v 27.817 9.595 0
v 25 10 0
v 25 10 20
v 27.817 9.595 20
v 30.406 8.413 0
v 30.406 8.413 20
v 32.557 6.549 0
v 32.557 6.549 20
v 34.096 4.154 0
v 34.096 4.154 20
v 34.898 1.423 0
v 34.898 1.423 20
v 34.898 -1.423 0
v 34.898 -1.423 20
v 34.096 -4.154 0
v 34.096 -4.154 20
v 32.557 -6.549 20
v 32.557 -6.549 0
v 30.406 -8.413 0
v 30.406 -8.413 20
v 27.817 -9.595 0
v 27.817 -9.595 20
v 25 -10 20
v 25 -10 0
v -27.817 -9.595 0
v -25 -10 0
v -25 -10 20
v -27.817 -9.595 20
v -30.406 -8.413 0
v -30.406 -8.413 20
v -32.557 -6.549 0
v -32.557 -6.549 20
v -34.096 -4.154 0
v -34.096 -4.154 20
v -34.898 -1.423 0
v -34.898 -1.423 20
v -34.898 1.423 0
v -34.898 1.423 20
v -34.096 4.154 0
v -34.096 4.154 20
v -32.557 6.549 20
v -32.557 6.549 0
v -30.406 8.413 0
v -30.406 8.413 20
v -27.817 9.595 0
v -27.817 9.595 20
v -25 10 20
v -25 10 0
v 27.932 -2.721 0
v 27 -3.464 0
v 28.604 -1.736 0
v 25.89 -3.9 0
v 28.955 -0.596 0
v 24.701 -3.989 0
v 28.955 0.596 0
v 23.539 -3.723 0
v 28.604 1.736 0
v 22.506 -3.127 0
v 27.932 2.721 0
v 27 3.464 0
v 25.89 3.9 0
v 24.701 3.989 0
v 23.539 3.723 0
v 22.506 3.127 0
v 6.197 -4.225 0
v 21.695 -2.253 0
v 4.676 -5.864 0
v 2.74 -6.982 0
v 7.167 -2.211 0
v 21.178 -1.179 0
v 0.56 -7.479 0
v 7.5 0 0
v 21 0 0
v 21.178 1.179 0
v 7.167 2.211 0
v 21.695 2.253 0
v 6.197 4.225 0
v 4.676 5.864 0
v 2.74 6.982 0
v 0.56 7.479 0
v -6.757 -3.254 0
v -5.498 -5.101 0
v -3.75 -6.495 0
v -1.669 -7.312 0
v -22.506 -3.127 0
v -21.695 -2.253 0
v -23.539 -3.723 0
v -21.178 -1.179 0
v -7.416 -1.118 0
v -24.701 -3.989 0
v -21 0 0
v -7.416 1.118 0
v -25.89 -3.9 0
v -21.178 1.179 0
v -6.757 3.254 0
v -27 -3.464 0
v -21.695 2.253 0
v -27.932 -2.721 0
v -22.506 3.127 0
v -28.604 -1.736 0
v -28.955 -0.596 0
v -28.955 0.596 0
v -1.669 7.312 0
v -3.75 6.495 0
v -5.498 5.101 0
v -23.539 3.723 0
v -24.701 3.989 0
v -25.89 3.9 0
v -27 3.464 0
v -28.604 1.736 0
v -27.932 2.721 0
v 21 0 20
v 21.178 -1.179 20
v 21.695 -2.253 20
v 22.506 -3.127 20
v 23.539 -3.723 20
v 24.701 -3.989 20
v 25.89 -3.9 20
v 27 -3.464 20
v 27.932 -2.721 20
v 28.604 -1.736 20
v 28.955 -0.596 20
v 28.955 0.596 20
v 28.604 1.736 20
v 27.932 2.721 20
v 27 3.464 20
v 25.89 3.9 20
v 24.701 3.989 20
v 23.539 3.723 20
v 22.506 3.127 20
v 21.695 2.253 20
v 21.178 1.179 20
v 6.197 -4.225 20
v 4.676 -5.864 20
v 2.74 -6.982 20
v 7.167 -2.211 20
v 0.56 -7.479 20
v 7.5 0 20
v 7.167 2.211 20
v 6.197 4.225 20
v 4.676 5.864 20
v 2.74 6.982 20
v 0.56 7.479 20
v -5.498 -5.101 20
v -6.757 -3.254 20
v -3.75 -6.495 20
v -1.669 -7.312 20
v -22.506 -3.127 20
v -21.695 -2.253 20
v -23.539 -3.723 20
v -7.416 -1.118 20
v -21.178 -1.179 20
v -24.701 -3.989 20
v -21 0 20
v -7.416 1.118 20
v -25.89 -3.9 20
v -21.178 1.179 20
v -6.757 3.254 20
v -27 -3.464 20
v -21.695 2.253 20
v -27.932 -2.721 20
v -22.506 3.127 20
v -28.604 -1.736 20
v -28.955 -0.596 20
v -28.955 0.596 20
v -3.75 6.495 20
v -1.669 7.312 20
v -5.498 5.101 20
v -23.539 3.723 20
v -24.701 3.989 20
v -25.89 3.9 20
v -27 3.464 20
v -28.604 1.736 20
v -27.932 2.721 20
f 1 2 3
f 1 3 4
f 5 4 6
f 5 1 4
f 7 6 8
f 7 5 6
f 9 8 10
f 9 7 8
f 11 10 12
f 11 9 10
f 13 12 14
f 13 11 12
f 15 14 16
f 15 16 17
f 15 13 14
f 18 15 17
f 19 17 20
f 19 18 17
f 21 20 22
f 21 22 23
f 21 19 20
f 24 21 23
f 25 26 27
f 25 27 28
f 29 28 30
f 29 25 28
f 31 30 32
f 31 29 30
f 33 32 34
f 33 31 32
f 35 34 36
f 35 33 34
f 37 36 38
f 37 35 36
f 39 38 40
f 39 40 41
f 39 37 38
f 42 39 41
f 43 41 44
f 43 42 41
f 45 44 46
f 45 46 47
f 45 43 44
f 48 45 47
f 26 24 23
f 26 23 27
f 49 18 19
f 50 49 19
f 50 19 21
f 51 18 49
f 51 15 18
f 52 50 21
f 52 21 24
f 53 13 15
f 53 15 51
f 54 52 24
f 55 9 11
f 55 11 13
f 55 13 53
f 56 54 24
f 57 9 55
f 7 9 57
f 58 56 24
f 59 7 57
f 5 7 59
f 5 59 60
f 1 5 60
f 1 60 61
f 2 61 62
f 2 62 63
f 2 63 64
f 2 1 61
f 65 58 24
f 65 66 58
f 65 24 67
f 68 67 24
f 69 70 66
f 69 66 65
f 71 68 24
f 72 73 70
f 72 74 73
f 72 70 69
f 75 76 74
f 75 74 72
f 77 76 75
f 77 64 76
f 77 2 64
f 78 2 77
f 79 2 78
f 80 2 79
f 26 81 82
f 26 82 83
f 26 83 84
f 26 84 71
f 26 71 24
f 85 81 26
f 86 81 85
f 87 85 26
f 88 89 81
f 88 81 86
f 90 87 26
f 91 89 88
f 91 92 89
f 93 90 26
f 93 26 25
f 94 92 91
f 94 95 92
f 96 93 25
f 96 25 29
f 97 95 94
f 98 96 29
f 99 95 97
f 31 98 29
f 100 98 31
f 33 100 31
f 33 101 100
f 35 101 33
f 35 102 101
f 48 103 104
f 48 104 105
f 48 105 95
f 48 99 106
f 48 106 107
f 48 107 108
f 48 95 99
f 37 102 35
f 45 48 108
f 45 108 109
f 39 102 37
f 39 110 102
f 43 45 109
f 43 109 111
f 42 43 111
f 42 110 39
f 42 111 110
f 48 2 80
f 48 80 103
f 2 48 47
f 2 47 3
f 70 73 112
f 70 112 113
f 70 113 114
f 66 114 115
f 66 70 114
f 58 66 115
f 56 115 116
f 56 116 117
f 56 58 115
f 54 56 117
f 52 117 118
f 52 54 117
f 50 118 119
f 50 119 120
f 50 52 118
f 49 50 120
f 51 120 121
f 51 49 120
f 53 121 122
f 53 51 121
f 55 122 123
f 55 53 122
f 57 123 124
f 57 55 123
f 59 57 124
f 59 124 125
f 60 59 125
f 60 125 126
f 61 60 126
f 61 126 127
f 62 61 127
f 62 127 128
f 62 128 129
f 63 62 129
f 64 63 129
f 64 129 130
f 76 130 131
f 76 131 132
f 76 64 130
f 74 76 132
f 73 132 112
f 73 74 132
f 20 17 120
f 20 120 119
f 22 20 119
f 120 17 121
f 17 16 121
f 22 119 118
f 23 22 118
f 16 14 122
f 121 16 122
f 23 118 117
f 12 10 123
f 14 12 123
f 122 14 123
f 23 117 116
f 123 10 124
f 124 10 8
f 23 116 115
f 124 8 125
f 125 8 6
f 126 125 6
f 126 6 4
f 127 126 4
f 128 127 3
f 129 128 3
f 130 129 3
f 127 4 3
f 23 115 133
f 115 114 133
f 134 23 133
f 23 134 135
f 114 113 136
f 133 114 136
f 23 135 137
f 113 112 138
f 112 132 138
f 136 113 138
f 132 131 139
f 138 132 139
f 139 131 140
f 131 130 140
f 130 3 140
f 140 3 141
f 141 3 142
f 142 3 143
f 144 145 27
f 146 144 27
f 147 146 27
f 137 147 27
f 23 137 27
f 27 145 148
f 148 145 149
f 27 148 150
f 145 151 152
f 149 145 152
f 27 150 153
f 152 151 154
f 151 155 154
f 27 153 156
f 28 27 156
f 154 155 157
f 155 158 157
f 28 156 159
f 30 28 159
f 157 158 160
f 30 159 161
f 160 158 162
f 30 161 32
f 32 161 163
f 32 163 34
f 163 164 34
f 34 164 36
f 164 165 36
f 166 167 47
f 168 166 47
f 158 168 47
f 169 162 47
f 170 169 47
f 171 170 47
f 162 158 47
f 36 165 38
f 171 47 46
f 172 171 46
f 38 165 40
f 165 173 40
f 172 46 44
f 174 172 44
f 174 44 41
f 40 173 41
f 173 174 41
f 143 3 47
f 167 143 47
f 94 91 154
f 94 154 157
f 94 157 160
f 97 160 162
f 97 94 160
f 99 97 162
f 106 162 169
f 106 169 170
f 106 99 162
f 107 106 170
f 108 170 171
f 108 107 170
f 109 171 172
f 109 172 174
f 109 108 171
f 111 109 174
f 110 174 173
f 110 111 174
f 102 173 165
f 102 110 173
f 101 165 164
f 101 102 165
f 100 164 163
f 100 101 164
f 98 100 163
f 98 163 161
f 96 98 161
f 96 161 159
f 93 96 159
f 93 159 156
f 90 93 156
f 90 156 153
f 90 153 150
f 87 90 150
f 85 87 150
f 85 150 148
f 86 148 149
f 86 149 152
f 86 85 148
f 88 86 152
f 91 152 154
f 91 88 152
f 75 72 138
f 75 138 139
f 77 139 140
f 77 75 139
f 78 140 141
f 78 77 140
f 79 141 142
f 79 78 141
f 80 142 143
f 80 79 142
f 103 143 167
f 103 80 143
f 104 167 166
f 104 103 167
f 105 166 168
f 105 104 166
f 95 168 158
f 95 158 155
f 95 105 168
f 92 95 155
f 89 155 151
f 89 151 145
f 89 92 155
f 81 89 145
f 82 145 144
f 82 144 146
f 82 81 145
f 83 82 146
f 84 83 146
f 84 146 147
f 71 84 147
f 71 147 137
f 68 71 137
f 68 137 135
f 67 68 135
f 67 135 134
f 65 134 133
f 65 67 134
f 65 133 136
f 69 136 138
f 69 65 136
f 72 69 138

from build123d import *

# Parameters (mm, degrees)
SKETCH_1_R      = 7.5
SKETCH_1_R_2    = 4
EXTRUDE_1_DEPTH = 20


with BuildPart() as part:
    # 草图1 → 凸台-拉伸1 (new body)
    with BuildSketch(Plane.XY):
        with BuildLine():
            Line((-25, 10), (25, 10))
            ThreePointArc((25, 10), (35, 0), (25, -10))
            Line((25, -10), (-25, -10))
            ThreePointArc((-25, -10), (-35, 0), (-25, 10))
        make_face()
        Circle(SKETCH_1_R, mode=Mode.SUBTRACT)
        with Locations((-25, 0)):
            Circle(SKETCH_1_R_2, mode=Mode.SUBTRACT)
        with Locations(Location((25, 0, 0), (0, 0, 180))):
            Circle(SKETCH_1_R_2, mode=Mode.SUBTRACT)
    extrude(amount=EXTRUDE_1_DEPTH)


solid = part.part
